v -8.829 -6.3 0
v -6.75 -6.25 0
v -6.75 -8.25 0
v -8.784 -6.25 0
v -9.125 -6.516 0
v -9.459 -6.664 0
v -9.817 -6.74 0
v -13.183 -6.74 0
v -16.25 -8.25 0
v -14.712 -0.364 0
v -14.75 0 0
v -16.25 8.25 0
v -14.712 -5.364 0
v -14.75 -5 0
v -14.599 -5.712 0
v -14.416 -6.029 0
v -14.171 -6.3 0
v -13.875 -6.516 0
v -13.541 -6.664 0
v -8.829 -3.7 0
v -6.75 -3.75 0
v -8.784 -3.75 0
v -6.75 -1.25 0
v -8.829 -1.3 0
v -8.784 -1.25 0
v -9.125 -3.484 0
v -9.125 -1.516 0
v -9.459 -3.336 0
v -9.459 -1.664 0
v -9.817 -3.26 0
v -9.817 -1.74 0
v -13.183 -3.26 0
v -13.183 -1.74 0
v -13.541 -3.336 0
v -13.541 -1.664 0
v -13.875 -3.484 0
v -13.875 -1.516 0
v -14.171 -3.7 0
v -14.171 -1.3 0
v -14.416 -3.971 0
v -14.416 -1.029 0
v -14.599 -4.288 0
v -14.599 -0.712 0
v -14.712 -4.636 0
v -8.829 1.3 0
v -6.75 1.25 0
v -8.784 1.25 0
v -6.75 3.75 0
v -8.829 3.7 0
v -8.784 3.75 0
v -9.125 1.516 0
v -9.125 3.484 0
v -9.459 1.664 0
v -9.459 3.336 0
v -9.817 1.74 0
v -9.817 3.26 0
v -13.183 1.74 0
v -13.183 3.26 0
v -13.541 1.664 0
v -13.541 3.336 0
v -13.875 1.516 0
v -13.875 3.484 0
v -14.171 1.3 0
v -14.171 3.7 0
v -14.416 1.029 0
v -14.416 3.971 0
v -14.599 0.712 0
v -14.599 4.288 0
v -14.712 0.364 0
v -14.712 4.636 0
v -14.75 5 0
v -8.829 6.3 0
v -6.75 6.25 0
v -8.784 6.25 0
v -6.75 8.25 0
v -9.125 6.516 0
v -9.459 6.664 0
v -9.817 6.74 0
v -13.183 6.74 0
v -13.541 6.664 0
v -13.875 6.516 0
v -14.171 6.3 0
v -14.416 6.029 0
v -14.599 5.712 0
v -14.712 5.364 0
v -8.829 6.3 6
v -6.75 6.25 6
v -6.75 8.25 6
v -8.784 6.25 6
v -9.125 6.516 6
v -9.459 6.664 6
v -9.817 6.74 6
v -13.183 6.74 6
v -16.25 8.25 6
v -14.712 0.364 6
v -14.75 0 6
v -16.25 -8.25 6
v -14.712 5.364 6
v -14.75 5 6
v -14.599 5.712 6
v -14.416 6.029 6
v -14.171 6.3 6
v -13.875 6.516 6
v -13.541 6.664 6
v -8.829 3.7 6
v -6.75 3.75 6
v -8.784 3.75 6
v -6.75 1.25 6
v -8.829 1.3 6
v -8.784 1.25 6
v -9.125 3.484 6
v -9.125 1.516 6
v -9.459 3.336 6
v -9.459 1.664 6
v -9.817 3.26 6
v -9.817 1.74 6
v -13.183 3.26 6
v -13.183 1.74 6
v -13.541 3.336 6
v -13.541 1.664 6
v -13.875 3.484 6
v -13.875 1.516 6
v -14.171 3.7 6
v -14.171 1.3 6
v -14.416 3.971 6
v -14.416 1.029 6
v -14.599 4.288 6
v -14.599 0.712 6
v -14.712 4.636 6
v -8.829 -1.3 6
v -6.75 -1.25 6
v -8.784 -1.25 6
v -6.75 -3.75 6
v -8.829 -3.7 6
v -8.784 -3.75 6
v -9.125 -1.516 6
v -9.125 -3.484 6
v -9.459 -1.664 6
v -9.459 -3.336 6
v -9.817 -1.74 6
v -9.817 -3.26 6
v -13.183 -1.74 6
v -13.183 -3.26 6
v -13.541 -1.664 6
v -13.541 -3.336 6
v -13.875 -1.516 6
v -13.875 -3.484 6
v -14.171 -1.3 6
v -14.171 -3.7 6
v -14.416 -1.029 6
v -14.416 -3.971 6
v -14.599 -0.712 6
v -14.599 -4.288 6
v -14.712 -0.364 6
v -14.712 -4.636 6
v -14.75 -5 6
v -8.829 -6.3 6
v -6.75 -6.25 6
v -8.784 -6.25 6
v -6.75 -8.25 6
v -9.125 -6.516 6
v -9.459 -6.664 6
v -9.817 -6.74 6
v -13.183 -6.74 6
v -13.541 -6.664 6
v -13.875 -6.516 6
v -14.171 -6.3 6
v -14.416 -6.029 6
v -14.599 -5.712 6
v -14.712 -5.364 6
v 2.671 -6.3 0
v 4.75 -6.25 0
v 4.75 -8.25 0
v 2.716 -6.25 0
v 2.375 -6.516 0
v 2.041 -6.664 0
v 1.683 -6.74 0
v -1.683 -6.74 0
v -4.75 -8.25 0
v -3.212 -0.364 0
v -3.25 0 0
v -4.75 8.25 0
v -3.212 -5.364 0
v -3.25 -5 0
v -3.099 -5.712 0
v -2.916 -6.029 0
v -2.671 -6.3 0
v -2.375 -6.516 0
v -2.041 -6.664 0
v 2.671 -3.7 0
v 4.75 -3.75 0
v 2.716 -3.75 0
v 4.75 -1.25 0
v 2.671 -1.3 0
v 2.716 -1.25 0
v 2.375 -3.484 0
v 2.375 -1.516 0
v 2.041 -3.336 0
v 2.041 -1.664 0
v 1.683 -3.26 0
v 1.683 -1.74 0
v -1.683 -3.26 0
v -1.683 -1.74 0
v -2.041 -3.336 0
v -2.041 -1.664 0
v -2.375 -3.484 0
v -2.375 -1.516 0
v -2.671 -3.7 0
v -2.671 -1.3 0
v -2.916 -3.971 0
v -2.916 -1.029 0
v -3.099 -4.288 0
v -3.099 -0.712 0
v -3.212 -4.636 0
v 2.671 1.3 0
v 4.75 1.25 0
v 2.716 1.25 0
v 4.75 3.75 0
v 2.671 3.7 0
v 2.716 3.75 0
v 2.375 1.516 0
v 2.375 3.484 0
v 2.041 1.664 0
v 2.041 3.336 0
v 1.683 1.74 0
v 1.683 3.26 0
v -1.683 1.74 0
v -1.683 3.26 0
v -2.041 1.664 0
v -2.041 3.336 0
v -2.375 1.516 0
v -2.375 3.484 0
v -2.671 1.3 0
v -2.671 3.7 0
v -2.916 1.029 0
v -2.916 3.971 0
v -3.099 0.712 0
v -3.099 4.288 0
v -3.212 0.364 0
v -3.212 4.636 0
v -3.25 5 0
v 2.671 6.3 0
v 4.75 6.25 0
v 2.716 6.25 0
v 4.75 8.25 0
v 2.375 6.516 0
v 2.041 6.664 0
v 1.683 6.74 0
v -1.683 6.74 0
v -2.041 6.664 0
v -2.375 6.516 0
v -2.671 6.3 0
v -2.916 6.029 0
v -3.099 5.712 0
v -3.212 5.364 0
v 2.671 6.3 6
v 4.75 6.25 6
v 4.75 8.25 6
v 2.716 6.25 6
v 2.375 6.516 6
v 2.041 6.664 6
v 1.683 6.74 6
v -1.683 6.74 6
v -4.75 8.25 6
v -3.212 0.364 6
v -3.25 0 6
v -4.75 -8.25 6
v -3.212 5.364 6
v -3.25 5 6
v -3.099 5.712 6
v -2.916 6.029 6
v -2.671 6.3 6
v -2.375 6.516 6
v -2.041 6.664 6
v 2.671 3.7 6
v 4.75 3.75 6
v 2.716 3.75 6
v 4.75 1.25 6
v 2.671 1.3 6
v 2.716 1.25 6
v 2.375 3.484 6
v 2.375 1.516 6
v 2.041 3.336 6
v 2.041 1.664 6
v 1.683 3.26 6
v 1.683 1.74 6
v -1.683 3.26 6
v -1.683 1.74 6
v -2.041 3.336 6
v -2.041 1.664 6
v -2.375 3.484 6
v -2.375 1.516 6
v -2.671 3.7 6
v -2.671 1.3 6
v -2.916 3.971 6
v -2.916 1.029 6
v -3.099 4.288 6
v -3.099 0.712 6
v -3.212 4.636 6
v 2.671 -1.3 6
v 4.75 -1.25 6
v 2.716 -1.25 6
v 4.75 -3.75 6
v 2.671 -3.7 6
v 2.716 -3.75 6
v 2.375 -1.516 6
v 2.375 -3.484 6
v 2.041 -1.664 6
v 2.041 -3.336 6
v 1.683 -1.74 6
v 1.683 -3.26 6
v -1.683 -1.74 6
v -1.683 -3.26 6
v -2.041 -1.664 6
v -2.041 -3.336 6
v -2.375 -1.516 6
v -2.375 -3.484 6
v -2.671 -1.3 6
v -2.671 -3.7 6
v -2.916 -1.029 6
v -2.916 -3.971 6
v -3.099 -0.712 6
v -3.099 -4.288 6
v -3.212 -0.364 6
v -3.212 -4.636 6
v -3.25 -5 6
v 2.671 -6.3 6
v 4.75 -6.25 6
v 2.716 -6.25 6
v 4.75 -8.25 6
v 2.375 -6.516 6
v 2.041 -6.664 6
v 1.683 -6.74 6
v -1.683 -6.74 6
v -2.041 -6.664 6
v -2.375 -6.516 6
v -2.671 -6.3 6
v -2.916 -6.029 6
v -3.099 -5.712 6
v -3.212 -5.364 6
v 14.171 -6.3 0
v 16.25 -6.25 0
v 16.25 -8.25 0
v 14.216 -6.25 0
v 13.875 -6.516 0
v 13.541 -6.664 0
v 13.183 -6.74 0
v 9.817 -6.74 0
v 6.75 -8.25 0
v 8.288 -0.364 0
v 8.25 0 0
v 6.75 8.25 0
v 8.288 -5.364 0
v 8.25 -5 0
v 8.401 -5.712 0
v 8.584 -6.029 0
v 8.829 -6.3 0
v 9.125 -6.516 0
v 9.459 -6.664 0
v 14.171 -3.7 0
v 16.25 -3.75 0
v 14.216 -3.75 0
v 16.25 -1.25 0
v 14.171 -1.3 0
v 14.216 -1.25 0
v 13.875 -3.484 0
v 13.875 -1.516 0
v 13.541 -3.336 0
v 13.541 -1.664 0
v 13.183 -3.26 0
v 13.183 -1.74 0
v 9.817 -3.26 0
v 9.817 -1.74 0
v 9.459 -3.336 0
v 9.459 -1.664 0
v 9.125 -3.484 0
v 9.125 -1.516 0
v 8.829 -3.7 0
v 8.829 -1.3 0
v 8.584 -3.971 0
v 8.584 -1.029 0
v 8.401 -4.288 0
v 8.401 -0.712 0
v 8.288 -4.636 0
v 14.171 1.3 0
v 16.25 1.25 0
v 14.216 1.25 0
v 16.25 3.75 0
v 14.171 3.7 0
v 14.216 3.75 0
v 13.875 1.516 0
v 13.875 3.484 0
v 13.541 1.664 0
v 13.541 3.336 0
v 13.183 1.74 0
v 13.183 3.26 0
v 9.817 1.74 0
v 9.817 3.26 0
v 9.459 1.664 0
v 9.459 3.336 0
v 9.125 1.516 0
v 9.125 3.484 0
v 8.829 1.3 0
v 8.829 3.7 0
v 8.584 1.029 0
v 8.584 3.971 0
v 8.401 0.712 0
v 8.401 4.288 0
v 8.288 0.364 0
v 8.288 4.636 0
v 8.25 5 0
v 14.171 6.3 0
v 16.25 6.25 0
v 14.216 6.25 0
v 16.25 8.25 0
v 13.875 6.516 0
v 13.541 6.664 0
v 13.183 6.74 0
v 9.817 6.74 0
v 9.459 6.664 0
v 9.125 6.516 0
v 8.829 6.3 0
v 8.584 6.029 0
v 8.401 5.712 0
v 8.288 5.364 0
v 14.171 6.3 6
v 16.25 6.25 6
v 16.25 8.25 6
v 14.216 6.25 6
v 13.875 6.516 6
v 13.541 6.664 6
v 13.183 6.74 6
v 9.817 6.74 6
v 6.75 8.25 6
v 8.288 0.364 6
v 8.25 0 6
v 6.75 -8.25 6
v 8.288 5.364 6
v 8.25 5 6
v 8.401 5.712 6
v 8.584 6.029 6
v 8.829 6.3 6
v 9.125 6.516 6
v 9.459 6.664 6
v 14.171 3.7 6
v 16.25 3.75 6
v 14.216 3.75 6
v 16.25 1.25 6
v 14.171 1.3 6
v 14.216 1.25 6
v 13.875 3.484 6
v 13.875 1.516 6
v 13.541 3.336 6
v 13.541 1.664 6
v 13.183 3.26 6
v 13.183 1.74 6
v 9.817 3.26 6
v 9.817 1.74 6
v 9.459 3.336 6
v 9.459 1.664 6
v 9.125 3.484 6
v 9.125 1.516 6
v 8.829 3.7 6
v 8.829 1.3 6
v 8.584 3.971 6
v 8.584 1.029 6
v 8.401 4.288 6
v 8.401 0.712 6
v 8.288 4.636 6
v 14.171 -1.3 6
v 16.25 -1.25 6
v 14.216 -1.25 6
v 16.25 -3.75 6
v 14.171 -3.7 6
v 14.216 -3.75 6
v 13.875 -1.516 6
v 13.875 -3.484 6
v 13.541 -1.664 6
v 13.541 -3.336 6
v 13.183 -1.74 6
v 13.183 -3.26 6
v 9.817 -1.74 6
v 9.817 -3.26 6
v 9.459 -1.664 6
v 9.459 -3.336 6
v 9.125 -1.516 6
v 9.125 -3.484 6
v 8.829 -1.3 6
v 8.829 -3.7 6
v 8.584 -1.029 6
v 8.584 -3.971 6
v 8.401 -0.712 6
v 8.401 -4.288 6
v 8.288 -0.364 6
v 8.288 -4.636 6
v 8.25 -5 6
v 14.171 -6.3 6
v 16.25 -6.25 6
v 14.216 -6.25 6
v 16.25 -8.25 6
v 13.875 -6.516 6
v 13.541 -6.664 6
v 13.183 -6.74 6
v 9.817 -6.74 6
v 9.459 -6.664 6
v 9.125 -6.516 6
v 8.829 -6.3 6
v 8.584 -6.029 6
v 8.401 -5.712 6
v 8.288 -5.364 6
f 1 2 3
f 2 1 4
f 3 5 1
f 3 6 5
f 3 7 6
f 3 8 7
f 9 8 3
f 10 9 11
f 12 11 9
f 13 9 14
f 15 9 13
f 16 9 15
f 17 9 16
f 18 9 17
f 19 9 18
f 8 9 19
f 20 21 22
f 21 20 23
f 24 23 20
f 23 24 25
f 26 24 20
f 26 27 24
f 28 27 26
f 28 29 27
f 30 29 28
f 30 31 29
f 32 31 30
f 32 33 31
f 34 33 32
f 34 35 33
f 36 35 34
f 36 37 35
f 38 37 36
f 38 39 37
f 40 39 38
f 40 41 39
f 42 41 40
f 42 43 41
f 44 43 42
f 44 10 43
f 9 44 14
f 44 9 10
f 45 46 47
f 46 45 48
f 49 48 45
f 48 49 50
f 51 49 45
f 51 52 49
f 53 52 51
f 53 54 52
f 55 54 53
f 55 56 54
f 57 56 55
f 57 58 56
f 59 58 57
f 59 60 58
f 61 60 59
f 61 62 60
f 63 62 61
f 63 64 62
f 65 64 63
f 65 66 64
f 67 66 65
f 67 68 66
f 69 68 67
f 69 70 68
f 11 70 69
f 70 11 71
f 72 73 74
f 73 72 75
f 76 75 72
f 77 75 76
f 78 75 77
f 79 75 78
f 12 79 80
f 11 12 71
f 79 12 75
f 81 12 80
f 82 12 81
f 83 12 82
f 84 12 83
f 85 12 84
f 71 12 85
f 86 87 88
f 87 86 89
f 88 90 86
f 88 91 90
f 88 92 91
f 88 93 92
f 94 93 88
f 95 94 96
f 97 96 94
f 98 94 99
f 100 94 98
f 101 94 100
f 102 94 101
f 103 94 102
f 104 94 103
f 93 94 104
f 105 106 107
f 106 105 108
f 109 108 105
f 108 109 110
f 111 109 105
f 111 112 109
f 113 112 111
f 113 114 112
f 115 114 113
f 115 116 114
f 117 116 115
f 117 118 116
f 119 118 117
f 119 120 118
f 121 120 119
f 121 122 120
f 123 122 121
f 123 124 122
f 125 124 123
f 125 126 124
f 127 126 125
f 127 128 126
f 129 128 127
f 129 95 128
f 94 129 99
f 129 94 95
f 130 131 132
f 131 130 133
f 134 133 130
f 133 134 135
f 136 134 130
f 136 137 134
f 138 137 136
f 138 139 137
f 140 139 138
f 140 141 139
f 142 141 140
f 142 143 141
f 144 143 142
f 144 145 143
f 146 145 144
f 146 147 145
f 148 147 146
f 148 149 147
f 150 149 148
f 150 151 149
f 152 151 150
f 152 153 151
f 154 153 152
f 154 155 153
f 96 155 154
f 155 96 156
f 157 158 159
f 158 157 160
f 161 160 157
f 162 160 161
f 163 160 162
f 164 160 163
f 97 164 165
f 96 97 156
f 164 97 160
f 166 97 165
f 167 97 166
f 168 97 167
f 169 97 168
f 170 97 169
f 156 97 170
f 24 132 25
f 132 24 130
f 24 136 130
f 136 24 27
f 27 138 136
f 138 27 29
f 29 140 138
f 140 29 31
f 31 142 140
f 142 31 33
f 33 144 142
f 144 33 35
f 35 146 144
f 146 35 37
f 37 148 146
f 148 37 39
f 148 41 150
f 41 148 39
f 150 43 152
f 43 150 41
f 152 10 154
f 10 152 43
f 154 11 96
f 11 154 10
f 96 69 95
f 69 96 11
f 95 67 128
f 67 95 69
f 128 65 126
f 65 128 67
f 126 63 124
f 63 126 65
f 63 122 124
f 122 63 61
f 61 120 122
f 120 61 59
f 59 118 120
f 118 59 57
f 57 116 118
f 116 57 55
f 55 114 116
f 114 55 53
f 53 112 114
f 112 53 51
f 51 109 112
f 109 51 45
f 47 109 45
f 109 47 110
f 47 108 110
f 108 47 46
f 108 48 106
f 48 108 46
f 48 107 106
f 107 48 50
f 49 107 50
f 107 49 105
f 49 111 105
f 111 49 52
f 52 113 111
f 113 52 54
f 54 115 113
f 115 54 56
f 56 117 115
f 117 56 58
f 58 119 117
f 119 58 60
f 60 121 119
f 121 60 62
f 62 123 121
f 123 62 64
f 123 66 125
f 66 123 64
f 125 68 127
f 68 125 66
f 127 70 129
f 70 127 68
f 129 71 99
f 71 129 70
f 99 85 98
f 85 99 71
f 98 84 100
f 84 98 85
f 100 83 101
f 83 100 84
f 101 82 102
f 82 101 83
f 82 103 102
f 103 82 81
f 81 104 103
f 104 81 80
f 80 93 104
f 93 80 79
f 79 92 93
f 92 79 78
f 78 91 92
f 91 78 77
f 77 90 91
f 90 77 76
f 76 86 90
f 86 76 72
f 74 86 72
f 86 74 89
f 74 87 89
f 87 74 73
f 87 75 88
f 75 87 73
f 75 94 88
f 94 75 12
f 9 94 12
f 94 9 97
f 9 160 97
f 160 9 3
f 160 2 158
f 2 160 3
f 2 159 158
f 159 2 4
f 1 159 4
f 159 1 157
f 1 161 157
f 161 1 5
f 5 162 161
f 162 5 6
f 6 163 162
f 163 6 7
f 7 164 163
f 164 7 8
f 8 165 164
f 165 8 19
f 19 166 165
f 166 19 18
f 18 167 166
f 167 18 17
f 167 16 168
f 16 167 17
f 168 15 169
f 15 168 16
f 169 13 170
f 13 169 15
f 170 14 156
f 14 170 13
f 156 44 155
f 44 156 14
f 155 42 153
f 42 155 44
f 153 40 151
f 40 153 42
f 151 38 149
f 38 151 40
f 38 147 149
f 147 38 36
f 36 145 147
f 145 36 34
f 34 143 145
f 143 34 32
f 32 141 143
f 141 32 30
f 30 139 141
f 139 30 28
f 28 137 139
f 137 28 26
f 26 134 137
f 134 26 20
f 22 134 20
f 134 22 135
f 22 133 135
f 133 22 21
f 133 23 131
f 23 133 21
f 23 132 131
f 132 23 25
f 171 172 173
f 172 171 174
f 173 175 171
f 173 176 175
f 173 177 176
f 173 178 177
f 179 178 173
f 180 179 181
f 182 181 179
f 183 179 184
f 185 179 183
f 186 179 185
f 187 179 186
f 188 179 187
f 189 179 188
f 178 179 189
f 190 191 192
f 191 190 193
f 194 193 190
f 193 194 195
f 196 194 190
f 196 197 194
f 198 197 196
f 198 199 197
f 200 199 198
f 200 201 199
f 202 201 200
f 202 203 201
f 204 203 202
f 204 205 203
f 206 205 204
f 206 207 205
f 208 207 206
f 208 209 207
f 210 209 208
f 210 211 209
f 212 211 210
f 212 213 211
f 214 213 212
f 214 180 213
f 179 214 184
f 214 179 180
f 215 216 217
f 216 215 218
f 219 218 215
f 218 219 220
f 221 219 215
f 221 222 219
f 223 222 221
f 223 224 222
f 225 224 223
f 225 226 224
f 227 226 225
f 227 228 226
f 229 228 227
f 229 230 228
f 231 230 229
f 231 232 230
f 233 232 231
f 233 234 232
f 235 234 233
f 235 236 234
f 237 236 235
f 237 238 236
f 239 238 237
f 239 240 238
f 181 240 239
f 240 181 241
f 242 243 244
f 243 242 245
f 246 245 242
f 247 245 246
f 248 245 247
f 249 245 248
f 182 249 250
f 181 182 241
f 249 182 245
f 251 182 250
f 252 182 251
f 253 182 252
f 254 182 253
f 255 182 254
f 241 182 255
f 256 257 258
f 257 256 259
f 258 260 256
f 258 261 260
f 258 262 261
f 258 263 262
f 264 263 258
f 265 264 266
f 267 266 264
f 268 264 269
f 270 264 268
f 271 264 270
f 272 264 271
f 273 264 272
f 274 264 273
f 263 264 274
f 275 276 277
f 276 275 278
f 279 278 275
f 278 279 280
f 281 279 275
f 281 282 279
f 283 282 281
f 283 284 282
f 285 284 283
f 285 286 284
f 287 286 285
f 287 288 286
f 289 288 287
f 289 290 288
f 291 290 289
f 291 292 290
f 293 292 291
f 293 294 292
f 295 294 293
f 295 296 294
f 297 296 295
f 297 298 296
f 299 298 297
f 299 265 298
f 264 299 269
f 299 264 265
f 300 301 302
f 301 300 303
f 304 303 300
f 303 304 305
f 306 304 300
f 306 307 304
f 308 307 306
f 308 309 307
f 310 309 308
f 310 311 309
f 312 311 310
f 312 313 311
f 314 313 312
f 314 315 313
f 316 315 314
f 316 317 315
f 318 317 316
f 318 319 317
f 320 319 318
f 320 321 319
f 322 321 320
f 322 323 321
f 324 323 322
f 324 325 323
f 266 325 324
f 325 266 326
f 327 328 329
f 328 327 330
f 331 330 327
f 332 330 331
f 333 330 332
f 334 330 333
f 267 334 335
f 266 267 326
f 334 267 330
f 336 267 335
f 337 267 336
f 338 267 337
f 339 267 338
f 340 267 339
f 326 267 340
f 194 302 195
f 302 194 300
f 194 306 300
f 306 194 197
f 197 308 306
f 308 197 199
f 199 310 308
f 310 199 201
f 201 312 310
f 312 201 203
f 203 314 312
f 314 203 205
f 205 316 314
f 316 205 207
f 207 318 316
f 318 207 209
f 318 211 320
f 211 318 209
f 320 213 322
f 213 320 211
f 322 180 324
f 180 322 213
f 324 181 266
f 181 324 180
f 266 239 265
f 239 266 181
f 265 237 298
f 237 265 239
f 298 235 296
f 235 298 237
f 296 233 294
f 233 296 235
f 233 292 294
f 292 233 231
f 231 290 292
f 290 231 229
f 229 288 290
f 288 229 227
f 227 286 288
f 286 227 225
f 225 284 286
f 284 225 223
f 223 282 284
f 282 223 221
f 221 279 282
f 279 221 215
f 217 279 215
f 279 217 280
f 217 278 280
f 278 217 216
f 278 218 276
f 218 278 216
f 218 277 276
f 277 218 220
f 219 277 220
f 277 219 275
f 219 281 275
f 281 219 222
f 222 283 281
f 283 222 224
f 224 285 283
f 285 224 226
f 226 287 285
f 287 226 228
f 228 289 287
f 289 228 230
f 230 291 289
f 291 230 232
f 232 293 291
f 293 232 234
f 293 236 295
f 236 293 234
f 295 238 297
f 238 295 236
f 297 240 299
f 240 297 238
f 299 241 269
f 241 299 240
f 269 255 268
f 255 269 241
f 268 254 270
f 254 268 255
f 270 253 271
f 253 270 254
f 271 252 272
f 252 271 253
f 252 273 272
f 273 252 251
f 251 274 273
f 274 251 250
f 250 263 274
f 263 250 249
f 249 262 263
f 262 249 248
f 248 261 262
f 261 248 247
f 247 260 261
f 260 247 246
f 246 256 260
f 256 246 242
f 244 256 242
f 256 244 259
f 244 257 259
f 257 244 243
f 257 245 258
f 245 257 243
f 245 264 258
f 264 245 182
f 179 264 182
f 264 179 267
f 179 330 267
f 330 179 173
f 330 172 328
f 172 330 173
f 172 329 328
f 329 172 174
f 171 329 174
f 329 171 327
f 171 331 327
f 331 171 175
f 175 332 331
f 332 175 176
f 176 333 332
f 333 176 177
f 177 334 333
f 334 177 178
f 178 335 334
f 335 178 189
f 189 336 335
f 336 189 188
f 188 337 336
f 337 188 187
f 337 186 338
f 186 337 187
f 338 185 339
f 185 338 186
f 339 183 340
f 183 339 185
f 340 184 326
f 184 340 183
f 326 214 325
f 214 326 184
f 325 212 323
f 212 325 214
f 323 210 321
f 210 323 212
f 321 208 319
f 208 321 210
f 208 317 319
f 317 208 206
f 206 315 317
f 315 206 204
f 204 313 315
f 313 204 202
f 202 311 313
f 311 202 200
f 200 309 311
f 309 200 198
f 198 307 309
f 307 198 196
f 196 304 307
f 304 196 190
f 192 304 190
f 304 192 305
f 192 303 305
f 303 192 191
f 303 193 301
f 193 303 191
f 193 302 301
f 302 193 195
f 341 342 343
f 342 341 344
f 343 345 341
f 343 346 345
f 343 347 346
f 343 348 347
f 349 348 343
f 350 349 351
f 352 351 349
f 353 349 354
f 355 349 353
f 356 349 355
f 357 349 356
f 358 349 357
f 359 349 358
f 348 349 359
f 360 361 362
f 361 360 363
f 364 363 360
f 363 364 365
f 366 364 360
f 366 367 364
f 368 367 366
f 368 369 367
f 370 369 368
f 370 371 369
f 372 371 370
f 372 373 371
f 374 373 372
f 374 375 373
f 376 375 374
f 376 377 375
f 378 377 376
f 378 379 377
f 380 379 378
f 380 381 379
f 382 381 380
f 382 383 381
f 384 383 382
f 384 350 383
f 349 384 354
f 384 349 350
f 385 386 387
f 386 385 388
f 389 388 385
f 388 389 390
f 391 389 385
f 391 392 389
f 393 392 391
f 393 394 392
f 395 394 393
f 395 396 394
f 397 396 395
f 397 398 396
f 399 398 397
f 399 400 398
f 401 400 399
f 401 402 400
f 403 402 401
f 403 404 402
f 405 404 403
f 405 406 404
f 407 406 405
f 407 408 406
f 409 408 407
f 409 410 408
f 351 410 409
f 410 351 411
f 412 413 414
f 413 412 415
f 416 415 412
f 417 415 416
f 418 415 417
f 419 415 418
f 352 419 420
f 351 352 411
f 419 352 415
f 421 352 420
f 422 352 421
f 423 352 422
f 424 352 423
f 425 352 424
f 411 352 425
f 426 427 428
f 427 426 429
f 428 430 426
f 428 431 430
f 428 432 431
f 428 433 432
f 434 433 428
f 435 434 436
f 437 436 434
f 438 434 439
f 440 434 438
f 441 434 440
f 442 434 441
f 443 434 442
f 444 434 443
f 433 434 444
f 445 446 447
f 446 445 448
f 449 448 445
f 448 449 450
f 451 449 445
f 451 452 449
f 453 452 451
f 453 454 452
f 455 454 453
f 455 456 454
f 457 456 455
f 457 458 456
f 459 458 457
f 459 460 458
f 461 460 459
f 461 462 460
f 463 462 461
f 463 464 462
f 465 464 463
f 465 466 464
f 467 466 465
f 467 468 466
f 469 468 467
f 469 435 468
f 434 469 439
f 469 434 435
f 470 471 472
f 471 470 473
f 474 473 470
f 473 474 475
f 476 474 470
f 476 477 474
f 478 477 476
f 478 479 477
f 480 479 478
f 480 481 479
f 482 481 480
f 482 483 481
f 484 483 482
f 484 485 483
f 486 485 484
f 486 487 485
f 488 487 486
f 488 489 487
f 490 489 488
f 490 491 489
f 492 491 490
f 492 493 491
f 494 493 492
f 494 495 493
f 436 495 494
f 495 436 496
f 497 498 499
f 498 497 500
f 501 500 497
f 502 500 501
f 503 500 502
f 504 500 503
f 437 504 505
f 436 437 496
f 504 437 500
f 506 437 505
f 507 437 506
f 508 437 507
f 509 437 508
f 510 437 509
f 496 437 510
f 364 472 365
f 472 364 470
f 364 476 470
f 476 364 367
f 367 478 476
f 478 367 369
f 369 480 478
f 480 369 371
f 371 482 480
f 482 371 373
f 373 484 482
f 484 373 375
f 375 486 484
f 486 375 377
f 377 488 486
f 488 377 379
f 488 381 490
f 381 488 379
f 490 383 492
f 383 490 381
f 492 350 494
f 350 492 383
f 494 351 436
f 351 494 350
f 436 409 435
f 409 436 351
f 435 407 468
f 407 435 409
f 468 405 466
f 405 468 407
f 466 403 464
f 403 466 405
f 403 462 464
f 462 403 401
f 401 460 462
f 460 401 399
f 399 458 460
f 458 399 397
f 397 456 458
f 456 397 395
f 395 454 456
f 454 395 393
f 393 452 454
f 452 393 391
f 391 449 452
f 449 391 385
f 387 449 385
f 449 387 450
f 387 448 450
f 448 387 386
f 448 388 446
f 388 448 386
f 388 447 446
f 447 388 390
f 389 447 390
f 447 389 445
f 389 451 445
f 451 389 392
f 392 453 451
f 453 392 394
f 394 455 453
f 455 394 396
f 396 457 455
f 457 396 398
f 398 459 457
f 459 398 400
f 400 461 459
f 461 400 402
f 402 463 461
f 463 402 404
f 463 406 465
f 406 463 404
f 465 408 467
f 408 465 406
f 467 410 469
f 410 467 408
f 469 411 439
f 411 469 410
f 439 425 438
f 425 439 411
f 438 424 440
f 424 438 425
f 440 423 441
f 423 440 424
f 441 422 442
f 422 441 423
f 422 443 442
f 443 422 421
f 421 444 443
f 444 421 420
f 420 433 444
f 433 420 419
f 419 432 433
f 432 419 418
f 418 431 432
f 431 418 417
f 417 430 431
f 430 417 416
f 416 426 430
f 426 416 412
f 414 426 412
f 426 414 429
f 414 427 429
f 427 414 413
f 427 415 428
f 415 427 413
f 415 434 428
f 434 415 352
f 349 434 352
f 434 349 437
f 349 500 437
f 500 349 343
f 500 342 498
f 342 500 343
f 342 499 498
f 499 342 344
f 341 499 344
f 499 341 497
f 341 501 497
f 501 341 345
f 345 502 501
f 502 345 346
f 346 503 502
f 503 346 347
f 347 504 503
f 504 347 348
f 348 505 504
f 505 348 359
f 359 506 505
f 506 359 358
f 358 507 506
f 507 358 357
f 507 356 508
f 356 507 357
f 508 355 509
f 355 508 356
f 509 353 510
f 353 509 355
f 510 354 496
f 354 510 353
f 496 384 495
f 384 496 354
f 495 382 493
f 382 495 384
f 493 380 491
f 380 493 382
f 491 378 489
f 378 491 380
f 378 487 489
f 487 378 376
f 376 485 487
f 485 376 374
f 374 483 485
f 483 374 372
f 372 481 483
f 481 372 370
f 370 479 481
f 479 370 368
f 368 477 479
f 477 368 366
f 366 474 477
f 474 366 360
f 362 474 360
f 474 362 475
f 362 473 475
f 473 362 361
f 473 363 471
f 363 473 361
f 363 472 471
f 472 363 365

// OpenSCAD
/* [Slot Parameters] */
// cable cutout width
ccw=6.5; // [3:0.5:20]

// cable cutout height
cch=3.5; // [1:0.5:10]

// length of extrusion
extrudeLen=6; // [3:25]

// wall thickness
wall=1.5; // [1:0.5:6]

// slot opening width
sow=2.5; // [1:0.5:10]

/* [Replication] */
// number of slots in each part
slotCount=3; // [1:10]

// number of parts to create
copies=3; // [1:20]

// space between (if multiple parts)
gap=2; // [1:20]

/* [Hidden] */
off = (ccw/2) - (cch/2); // offset (from CL) for conductor centers
tw=ccw+(2*wall); // total width
th=cch+(2*wall); // total height
slotOrg=0; // used to position each slot
$fn=30; // make circles somewhat smooth
centerXOff=(((tw+gap)*(copies-1))/2); // center copies on x axis
centerYOff=(((cch+wall)*slotCount)+wall)/2; // center part on Y axis

for(offset = [0:copies-1]) // loop to create multiple parts
{
    xoff = offset*(tw + gap) - centerXOff;
    linear_extrude(height = extrudeLen) // extrude part(s)
    {
        for(slot = [0:slotCount-1])  // duplicate slot for each cable slot
        {
            slotOrg = (cch+wall)*slot;
            translate([xoff,slotOrg-centerYOff,0]) // move orgin for each part
            {
                translate([0,th/2,0]) // move orgin for each slot
                difference()
                {
                    square([tw, th], center=true); // outside
                    hull() // hole for cable
                    {
                        translate([off,0,0]) circle(d=cch);
                        translate([-off,0,0]) circle(d=cch);
                    }
                    translate([0,-(sow)/2,0]) square([(tw/2+1),sow]); // edge cutout
                }
            }
        }
    }
}
